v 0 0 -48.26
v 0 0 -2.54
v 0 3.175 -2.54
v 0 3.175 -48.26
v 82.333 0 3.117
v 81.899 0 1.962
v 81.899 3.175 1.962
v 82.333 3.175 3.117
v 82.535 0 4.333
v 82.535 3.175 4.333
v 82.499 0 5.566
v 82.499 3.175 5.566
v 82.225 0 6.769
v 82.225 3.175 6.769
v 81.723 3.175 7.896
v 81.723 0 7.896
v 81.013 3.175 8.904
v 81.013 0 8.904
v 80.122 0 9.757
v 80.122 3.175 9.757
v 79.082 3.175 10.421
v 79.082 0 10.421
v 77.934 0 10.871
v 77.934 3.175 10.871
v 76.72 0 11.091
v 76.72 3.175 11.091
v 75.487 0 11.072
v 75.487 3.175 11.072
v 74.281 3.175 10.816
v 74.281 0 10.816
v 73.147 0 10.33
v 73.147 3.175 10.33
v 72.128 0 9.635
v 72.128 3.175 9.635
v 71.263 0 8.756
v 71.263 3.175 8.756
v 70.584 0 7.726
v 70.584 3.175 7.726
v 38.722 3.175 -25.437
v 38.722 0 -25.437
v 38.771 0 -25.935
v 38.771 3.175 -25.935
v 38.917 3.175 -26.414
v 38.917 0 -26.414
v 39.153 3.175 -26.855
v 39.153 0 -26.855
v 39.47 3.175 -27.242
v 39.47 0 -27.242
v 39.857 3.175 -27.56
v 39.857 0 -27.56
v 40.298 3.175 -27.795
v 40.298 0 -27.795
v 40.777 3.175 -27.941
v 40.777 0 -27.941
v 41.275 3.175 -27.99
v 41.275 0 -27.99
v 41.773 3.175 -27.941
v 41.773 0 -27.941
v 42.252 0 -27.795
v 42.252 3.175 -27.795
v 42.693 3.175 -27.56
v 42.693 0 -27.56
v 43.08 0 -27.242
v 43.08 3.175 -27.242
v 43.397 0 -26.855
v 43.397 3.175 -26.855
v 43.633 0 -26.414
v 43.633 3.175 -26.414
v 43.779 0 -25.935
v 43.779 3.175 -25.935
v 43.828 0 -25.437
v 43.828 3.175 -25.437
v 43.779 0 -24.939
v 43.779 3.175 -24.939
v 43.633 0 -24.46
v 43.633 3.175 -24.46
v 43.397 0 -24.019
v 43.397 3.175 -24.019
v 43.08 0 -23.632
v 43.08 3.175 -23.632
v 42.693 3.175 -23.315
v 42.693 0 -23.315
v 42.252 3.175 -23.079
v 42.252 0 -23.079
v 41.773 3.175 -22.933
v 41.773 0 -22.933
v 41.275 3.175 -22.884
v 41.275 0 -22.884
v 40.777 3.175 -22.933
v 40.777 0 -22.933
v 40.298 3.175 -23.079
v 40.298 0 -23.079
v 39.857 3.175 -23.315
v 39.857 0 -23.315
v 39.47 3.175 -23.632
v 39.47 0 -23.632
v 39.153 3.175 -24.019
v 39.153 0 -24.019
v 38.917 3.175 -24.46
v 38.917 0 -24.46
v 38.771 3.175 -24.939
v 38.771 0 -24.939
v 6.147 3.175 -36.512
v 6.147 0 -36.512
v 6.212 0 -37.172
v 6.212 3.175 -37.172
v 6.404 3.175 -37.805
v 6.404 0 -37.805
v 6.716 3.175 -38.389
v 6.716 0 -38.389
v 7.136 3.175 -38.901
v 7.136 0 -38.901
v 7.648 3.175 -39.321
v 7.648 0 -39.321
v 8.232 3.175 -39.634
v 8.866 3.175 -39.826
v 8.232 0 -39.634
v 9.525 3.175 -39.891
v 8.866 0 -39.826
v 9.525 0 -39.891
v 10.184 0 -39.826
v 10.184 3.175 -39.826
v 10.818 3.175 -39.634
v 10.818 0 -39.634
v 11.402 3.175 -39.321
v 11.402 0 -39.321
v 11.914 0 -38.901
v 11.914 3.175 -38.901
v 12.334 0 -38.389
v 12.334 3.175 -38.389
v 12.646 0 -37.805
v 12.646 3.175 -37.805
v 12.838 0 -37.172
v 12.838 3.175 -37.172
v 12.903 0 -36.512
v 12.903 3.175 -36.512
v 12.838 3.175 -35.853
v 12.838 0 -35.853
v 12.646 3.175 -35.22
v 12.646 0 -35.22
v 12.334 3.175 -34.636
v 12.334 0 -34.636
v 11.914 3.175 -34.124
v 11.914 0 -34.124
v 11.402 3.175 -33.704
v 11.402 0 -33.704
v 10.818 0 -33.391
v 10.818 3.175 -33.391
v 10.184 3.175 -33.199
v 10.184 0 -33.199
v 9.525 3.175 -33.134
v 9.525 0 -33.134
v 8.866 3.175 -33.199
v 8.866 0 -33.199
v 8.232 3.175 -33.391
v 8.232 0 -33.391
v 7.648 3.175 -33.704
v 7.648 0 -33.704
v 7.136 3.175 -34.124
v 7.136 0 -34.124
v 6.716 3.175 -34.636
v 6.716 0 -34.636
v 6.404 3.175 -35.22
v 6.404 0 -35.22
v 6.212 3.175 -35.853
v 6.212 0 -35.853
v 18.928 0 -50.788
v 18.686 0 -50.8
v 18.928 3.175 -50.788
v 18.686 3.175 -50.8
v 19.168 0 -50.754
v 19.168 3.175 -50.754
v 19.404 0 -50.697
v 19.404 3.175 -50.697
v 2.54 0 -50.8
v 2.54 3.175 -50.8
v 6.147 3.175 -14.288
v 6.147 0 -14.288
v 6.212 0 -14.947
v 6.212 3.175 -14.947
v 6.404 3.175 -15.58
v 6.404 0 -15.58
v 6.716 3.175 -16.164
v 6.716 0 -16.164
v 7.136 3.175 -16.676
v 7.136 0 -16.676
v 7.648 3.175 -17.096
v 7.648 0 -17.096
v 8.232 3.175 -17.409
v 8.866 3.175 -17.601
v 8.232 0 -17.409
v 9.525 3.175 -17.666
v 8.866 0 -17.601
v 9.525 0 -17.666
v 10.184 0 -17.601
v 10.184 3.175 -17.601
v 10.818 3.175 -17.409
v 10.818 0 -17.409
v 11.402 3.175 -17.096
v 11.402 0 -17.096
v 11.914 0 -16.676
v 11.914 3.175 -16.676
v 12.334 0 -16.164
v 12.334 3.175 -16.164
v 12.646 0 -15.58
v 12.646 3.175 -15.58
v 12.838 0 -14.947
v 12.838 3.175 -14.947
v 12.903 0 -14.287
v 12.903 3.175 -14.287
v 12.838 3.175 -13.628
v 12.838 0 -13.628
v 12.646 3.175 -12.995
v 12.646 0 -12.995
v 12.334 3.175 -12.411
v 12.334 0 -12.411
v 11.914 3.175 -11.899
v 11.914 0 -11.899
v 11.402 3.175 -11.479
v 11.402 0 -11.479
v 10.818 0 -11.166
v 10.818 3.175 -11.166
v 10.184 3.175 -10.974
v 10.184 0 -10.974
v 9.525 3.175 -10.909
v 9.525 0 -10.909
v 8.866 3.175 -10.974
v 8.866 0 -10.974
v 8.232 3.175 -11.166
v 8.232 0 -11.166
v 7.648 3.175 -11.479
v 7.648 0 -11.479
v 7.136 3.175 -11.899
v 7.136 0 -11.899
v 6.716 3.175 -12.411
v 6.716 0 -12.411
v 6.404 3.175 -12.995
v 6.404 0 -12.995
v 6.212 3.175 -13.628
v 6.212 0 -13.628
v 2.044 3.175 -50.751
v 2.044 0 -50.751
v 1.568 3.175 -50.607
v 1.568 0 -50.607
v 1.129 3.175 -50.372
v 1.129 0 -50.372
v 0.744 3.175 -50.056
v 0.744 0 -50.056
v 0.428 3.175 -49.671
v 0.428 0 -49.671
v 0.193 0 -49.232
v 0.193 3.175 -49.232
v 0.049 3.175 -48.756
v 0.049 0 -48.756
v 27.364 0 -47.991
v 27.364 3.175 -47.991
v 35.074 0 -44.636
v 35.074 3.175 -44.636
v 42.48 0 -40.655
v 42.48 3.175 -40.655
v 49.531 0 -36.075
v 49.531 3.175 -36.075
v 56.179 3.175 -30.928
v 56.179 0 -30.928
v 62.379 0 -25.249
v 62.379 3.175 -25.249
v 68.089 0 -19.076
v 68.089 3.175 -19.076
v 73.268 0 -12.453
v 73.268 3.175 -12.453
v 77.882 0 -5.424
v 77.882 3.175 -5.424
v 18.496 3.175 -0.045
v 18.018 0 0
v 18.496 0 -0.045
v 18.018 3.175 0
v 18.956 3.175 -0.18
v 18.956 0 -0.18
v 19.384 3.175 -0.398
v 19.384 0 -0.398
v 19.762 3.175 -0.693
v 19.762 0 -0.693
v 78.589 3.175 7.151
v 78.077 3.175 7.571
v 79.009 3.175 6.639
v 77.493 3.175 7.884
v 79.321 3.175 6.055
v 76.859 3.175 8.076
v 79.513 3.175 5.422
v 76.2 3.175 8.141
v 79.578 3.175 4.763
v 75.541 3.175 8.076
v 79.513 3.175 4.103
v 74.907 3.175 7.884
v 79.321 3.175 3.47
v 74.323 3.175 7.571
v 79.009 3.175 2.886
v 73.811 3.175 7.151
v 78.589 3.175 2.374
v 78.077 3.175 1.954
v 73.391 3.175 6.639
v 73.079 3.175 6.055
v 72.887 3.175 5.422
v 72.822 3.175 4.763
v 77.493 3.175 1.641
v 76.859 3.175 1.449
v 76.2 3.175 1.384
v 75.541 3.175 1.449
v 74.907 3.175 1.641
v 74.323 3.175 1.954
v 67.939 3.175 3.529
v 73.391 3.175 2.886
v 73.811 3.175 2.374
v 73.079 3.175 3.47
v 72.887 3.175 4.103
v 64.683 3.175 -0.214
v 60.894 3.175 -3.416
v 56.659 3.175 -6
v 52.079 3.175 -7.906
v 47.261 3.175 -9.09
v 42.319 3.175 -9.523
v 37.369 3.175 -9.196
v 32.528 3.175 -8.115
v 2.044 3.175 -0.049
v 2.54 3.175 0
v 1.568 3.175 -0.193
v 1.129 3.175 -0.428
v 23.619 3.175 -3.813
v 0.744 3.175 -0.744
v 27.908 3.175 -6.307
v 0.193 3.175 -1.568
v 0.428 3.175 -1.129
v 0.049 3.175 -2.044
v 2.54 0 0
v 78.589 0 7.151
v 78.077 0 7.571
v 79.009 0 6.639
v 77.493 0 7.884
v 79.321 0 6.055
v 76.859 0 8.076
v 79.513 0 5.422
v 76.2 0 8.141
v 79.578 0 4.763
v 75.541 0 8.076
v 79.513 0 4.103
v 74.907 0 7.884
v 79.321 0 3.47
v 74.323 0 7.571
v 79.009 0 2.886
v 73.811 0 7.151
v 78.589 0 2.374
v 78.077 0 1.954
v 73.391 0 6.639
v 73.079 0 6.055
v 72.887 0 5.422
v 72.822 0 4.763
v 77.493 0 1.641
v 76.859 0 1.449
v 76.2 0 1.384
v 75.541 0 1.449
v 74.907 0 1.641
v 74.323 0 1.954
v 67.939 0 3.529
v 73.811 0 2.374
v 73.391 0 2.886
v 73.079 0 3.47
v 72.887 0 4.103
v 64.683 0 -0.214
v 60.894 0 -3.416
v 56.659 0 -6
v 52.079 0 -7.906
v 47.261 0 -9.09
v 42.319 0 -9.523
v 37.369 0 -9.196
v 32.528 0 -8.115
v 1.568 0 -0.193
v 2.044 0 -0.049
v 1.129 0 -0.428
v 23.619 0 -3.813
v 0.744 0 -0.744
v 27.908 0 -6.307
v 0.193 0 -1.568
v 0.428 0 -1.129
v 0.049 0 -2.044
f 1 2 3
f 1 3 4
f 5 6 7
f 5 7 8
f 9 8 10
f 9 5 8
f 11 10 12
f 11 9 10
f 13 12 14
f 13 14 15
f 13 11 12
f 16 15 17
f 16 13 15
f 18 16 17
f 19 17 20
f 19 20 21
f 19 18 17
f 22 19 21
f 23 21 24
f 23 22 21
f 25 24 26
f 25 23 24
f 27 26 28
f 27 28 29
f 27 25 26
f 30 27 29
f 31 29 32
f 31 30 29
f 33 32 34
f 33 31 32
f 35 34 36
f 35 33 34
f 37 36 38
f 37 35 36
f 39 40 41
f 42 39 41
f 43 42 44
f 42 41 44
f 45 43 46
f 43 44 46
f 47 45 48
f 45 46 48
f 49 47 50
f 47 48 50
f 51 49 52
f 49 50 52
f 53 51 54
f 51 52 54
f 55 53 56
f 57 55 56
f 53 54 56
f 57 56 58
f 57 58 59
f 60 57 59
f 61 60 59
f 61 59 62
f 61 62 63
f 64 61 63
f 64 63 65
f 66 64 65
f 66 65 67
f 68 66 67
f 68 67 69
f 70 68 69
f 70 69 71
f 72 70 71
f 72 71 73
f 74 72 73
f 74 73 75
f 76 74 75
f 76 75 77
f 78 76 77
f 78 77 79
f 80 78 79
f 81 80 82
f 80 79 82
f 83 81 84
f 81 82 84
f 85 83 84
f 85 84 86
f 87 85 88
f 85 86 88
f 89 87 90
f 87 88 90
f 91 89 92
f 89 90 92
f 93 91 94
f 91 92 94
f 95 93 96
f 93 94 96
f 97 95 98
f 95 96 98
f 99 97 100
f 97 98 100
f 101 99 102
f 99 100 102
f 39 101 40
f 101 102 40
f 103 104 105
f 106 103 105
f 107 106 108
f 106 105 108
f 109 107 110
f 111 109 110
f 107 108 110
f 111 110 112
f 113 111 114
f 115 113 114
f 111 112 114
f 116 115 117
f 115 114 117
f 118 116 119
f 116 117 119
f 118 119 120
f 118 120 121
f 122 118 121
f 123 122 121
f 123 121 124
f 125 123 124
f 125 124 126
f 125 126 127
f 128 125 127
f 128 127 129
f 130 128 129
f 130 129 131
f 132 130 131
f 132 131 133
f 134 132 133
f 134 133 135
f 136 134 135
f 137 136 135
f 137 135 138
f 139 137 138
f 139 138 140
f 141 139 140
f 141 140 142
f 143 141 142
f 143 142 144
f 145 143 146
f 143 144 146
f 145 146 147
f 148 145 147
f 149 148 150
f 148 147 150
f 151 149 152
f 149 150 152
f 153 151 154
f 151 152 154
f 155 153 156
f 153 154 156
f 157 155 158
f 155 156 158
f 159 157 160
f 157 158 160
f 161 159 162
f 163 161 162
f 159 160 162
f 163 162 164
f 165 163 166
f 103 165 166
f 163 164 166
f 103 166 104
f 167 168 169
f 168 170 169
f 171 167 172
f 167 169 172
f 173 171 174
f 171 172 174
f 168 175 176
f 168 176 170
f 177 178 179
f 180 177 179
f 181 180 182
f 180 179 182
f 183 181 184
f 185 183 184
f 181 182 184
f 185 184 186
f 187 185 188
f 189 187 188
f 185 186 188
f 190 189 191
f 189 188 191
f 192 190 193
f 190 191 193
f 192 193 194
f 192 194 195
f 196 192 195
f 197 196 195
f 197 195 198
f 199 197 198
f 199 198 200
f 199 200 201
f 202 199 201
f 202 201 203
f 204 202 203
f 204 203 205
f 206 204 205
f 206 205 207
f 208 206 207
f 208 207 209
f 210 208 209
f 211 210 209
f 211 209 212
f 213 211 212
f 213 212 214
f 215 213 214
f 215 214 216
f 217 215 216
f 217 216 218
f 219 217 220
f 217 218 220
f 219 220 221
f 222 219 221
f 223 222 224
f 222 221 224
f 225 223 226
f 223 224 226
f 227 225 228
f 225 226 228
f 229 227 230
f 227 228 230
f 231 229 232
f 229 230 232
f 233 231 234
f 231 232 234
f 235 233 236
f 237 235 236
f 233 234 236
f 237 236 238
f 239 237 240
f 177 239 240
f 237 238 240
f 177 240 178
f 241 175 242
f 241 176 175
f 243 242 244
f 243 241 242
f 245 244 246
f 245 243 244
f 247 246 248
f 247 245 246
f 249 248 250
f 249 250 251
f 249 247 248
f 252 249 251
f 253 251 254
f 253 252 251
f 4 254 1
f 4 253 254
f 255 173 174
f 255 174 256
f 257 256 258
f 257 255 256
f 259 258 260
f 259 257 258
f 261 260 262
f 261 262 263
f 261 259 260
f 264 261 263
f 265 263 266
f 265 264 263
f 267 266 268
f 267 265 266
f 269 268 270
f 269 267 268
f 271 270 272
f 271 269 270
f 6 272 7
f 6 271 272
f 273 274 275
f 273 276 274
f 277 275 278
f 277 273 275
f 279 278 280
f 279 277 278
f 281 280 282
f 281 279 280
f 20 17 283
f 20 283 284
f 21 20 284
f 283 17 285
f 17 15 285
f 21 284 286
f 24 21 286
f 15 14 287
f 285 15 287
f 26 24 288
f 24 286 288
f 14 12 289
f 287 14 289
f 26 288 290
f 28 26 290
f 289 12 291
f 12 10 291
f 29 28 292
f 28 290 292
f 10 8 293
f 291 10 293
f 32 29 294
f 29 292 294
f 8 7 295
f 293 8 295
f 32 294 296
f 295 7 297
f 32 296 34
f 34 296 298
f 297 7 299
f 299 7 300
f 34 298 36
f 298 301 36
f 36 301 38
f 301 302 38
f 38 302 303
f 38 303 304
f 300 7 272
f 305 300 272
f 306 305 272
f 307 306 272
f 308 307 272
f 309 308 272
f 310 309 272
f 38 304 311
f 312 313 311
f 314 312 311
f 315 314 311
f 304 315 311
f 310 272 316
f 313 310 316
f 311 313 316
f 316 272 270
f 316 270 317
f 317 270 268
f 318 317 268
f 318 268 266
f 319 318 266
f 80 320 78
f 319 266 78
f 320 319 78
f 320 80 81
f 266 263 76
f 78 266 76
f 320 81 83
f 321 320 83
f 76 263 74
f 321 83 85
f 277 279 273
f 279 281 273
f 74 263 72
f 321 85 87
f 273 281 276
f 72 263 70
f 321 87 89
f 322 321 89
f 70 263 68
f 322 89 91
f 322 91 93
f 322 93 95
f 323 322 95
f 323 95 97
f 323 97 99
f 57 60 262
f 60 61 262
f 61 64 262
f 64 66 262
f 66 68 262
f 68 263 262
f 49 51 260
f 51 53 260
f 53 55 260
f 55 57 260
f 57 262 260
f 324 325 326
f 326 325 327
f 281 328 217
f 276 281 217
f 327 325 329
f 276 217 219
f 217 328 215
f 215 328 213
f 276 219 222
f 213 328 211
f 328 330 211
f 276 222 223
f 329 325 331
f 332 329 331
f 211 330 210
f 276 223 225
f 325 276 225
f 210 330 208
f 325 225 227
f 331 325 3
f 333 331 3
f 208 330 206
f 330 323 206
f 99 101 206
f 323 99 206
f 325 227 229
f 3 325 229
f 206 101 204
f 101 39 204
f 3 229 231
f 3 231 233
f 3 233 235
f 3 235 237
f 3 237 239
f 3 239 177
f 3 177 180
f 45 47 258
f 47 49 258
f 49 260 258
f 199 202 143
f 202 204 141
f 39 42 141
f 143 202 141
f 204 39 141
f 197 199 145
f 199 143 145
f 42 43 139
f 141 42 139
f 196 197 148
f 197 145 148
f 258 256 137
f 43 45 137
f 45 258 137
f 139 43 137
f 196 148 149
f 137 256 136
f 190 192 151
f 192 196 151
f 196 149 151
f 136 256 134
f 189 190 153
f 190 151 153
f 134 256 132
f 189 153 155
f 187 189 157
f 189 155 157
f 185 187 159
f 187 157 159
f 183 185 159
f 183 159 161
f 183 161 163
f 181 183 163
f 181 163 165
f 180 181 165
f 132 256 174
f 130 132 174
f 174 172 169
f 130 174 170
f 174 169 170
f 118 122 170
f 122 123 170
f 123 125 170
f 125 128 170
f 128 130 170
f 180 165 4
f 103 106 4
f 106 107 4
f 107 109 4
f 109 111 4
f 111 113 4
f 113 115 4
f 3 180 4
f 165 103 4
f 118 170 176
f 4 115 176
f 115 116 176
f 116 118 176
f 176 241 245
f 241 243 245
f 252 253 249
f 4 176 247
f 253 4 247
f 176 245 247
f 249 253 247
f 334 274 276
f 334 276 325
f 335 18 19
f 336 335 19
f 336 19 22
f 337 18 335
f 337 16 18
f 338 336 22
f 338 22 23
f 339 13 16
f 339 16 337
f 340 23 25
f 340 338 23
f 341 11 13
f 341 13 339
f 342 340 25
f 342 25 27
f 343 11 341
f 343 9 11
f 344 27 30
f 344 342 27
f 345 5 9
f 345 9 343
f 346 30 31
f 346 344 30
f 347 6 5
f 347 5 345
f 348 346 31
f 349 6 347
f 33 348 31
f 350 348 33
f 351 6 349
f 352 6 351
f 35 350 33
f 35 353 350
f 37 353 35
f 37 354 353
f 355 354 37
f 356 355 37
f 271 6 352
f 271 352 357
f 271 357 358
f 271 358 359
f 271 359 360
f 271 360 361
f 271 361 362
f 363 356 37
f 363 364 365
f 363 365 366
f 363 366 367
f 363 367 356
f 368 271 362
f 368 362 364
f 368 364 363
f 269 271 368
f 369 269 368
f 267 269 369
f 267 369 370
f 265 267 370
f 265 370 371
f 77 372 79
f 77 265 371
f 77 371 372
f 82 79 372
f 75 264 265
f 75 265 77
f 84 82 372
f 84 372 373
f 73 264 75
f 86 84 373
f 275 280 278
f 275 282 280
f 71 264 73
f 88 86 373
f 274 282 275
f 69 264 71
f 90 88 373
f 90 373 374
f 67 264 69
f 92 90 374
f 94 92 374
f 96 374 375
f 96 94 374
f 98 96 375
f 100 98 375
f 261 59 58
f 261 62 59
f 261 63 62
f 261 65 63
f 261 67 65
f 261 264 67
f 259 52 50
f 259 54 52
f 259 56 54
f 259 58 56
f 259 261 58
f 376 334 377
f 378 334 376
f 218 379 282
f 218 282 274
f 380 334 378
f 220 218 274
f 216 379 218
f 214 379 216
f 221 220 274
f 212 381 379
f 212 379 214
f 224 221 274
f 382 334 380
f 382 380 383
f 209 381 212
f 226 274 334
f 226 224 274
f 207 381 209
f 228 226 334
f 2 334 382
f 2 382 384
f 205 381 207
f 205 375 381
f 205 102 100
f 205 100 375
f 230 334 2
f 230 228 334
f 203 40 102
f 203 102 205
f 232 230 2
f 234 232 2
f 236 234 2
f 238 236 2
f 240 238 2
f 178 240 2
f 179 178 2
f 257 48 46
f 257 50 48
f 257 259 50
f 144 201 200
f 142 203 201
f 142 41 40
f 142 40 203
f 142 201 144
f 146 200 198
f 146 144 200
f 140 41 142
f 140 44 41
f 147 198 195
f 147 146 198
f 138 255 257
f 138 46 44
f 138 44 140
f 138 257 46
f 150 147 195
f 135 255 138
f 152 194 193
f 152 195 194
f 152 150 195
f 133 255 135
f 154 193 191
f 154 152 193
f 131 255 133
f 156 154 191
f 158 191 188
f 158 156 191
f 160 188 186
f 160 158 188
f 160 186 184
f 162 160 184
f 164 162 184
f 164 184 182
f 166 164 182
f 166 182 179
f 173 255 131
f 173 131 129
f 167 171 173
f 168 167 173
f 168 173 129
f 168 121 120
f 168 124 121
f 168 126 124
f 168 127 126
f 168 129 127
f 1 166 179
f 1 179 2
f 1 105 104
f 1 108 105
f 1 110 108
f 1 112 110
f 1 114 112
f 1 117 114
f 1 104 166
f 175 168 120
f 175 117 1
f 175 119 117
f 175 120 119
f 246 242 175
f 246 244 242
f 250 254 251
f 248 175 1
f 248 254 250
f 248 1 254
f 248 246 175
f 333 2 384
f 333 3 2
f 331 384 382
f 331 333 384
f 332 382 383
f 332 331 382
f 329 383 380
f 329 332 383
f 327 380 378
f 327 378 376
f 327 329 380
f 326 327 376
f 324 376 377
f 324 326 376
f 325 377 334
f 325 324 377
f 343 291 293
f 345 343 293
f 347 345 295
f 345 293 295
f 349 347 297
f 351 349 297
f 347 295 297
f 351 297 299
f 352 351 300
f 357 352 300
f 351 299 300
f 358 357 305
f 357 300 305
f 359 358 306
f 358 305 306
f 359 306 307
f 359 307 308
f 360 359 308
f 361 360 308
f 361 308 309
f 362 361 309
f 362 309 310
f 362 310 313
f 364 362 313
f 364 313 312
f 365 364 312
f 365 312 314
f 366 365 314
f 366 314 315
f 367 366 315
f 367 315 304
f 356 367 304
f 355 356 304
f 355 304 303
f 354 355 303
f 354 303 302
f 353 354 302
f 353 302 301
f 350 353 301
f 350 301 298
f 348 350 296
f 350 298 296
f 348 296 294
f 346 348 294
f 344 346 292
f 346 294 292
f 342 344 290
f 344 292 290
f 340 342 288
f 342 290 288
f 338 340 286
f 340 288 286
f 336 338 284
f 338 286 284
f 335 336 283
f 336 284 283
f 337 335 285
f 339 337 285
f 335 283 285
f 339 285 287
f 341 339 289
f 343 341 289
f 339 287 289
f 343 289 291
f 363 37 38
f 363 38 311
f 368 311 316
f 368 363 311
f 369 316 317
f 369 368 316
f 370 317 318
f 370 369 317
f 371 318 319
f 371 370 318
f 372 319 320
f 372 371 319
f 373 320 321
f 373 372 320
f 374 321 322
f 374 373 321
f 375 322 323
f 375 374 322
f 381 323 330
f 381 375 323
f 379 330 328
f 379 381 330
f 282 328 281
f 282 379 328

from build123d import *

# Parameters (mm, degrees)
BOSS_EXTRUDE1_DEPTH        = 3.175
F_1_4_CLEARANCE_HOLE2_D    = 6.7564
F_1_4_CLEARANCE_HOLE1_D    = 6.7564
FILLET1_R                  = 2.54
F_10_CLEARANCE_HOLE1_D     = 5.1054
F_10_CLEARANCE_HOLE1_DEPTH = 3.175


with BuildPart() as part:
    # Sketch1 → Boss-Extrude1 (new body)
    with BuildSketch(Plane(origin=(0, 0, 0), x_dir=(1, 0, 0), z_dir=(0, 1, 0))):
        with BuildLine():
            Line((0, 50.8), (19.05, 50.8))
            ThreePointArc((19.05, 50.8), (56.03836137, 31.046405743), (81.899154962, -1.962119182))
            ThreePointArc((81.899154962, -1.962119182), (79.082321477, -10.420655433), (70.584022136, -7.726162031))
            ThreePointArc((70.584022136, -7.726162031), (46.770595677, 9.16746016), (19.05, 0))
            Line((19.05, 0), (0, 0))
            Line((0, 0), (0, 50.8))
        make_face()
    extrude(amount=BOSS_EXTRUDE1_DEPTH)

    # 1/4 Clearance Hole2 (through all)
    with Locations(Plane(origin=(0, 0, 0), x_dir=(-1, 0, 0), z_dir=(0, -1, 0))):
        with Locations((-76.2, -4.7625)):
            Hole(F_1_4_CLEARANCE_HOLE2_D / 2)

    # 1/4 Clearance Hole1 (through all)
    with Locations(Plane(origin=(0, 3.175, 0), x_dir=(1, 0, 0), z_dir=(0, 1, 0))):
        with Locations((9.525, 36.5125), (9.525, 14.2875)):
            Hole(F_1_4_CLEARANCE_HOLE1_D / 2)

    # Fillet1
    fillet1_edges = [part.edges().sort_by_distance(p)[0] for p in [
        (0, 1.5875, -50.8),
        (19.05, 1.5875, -50.8),
        (19.05, 1.5875, 0),
        (0, 1.5875, 0),
    ]]
    fillet(fillet1_edges, radius=FILLET1_R)

    # #10 Clearance Hole1
    with Locations(Plane(origin=(0, 3.175, 0), x_dir=(1, 0, 0), z_dir=(0, 1, 0))):
        with Locations((41.275, 25.437101907)):
            Hole(F_10_CLEARANCE_HOLE1_D / 2, depth=F_10_CLEARANCE_HOLE1_DEPTH)


solid = part.part
